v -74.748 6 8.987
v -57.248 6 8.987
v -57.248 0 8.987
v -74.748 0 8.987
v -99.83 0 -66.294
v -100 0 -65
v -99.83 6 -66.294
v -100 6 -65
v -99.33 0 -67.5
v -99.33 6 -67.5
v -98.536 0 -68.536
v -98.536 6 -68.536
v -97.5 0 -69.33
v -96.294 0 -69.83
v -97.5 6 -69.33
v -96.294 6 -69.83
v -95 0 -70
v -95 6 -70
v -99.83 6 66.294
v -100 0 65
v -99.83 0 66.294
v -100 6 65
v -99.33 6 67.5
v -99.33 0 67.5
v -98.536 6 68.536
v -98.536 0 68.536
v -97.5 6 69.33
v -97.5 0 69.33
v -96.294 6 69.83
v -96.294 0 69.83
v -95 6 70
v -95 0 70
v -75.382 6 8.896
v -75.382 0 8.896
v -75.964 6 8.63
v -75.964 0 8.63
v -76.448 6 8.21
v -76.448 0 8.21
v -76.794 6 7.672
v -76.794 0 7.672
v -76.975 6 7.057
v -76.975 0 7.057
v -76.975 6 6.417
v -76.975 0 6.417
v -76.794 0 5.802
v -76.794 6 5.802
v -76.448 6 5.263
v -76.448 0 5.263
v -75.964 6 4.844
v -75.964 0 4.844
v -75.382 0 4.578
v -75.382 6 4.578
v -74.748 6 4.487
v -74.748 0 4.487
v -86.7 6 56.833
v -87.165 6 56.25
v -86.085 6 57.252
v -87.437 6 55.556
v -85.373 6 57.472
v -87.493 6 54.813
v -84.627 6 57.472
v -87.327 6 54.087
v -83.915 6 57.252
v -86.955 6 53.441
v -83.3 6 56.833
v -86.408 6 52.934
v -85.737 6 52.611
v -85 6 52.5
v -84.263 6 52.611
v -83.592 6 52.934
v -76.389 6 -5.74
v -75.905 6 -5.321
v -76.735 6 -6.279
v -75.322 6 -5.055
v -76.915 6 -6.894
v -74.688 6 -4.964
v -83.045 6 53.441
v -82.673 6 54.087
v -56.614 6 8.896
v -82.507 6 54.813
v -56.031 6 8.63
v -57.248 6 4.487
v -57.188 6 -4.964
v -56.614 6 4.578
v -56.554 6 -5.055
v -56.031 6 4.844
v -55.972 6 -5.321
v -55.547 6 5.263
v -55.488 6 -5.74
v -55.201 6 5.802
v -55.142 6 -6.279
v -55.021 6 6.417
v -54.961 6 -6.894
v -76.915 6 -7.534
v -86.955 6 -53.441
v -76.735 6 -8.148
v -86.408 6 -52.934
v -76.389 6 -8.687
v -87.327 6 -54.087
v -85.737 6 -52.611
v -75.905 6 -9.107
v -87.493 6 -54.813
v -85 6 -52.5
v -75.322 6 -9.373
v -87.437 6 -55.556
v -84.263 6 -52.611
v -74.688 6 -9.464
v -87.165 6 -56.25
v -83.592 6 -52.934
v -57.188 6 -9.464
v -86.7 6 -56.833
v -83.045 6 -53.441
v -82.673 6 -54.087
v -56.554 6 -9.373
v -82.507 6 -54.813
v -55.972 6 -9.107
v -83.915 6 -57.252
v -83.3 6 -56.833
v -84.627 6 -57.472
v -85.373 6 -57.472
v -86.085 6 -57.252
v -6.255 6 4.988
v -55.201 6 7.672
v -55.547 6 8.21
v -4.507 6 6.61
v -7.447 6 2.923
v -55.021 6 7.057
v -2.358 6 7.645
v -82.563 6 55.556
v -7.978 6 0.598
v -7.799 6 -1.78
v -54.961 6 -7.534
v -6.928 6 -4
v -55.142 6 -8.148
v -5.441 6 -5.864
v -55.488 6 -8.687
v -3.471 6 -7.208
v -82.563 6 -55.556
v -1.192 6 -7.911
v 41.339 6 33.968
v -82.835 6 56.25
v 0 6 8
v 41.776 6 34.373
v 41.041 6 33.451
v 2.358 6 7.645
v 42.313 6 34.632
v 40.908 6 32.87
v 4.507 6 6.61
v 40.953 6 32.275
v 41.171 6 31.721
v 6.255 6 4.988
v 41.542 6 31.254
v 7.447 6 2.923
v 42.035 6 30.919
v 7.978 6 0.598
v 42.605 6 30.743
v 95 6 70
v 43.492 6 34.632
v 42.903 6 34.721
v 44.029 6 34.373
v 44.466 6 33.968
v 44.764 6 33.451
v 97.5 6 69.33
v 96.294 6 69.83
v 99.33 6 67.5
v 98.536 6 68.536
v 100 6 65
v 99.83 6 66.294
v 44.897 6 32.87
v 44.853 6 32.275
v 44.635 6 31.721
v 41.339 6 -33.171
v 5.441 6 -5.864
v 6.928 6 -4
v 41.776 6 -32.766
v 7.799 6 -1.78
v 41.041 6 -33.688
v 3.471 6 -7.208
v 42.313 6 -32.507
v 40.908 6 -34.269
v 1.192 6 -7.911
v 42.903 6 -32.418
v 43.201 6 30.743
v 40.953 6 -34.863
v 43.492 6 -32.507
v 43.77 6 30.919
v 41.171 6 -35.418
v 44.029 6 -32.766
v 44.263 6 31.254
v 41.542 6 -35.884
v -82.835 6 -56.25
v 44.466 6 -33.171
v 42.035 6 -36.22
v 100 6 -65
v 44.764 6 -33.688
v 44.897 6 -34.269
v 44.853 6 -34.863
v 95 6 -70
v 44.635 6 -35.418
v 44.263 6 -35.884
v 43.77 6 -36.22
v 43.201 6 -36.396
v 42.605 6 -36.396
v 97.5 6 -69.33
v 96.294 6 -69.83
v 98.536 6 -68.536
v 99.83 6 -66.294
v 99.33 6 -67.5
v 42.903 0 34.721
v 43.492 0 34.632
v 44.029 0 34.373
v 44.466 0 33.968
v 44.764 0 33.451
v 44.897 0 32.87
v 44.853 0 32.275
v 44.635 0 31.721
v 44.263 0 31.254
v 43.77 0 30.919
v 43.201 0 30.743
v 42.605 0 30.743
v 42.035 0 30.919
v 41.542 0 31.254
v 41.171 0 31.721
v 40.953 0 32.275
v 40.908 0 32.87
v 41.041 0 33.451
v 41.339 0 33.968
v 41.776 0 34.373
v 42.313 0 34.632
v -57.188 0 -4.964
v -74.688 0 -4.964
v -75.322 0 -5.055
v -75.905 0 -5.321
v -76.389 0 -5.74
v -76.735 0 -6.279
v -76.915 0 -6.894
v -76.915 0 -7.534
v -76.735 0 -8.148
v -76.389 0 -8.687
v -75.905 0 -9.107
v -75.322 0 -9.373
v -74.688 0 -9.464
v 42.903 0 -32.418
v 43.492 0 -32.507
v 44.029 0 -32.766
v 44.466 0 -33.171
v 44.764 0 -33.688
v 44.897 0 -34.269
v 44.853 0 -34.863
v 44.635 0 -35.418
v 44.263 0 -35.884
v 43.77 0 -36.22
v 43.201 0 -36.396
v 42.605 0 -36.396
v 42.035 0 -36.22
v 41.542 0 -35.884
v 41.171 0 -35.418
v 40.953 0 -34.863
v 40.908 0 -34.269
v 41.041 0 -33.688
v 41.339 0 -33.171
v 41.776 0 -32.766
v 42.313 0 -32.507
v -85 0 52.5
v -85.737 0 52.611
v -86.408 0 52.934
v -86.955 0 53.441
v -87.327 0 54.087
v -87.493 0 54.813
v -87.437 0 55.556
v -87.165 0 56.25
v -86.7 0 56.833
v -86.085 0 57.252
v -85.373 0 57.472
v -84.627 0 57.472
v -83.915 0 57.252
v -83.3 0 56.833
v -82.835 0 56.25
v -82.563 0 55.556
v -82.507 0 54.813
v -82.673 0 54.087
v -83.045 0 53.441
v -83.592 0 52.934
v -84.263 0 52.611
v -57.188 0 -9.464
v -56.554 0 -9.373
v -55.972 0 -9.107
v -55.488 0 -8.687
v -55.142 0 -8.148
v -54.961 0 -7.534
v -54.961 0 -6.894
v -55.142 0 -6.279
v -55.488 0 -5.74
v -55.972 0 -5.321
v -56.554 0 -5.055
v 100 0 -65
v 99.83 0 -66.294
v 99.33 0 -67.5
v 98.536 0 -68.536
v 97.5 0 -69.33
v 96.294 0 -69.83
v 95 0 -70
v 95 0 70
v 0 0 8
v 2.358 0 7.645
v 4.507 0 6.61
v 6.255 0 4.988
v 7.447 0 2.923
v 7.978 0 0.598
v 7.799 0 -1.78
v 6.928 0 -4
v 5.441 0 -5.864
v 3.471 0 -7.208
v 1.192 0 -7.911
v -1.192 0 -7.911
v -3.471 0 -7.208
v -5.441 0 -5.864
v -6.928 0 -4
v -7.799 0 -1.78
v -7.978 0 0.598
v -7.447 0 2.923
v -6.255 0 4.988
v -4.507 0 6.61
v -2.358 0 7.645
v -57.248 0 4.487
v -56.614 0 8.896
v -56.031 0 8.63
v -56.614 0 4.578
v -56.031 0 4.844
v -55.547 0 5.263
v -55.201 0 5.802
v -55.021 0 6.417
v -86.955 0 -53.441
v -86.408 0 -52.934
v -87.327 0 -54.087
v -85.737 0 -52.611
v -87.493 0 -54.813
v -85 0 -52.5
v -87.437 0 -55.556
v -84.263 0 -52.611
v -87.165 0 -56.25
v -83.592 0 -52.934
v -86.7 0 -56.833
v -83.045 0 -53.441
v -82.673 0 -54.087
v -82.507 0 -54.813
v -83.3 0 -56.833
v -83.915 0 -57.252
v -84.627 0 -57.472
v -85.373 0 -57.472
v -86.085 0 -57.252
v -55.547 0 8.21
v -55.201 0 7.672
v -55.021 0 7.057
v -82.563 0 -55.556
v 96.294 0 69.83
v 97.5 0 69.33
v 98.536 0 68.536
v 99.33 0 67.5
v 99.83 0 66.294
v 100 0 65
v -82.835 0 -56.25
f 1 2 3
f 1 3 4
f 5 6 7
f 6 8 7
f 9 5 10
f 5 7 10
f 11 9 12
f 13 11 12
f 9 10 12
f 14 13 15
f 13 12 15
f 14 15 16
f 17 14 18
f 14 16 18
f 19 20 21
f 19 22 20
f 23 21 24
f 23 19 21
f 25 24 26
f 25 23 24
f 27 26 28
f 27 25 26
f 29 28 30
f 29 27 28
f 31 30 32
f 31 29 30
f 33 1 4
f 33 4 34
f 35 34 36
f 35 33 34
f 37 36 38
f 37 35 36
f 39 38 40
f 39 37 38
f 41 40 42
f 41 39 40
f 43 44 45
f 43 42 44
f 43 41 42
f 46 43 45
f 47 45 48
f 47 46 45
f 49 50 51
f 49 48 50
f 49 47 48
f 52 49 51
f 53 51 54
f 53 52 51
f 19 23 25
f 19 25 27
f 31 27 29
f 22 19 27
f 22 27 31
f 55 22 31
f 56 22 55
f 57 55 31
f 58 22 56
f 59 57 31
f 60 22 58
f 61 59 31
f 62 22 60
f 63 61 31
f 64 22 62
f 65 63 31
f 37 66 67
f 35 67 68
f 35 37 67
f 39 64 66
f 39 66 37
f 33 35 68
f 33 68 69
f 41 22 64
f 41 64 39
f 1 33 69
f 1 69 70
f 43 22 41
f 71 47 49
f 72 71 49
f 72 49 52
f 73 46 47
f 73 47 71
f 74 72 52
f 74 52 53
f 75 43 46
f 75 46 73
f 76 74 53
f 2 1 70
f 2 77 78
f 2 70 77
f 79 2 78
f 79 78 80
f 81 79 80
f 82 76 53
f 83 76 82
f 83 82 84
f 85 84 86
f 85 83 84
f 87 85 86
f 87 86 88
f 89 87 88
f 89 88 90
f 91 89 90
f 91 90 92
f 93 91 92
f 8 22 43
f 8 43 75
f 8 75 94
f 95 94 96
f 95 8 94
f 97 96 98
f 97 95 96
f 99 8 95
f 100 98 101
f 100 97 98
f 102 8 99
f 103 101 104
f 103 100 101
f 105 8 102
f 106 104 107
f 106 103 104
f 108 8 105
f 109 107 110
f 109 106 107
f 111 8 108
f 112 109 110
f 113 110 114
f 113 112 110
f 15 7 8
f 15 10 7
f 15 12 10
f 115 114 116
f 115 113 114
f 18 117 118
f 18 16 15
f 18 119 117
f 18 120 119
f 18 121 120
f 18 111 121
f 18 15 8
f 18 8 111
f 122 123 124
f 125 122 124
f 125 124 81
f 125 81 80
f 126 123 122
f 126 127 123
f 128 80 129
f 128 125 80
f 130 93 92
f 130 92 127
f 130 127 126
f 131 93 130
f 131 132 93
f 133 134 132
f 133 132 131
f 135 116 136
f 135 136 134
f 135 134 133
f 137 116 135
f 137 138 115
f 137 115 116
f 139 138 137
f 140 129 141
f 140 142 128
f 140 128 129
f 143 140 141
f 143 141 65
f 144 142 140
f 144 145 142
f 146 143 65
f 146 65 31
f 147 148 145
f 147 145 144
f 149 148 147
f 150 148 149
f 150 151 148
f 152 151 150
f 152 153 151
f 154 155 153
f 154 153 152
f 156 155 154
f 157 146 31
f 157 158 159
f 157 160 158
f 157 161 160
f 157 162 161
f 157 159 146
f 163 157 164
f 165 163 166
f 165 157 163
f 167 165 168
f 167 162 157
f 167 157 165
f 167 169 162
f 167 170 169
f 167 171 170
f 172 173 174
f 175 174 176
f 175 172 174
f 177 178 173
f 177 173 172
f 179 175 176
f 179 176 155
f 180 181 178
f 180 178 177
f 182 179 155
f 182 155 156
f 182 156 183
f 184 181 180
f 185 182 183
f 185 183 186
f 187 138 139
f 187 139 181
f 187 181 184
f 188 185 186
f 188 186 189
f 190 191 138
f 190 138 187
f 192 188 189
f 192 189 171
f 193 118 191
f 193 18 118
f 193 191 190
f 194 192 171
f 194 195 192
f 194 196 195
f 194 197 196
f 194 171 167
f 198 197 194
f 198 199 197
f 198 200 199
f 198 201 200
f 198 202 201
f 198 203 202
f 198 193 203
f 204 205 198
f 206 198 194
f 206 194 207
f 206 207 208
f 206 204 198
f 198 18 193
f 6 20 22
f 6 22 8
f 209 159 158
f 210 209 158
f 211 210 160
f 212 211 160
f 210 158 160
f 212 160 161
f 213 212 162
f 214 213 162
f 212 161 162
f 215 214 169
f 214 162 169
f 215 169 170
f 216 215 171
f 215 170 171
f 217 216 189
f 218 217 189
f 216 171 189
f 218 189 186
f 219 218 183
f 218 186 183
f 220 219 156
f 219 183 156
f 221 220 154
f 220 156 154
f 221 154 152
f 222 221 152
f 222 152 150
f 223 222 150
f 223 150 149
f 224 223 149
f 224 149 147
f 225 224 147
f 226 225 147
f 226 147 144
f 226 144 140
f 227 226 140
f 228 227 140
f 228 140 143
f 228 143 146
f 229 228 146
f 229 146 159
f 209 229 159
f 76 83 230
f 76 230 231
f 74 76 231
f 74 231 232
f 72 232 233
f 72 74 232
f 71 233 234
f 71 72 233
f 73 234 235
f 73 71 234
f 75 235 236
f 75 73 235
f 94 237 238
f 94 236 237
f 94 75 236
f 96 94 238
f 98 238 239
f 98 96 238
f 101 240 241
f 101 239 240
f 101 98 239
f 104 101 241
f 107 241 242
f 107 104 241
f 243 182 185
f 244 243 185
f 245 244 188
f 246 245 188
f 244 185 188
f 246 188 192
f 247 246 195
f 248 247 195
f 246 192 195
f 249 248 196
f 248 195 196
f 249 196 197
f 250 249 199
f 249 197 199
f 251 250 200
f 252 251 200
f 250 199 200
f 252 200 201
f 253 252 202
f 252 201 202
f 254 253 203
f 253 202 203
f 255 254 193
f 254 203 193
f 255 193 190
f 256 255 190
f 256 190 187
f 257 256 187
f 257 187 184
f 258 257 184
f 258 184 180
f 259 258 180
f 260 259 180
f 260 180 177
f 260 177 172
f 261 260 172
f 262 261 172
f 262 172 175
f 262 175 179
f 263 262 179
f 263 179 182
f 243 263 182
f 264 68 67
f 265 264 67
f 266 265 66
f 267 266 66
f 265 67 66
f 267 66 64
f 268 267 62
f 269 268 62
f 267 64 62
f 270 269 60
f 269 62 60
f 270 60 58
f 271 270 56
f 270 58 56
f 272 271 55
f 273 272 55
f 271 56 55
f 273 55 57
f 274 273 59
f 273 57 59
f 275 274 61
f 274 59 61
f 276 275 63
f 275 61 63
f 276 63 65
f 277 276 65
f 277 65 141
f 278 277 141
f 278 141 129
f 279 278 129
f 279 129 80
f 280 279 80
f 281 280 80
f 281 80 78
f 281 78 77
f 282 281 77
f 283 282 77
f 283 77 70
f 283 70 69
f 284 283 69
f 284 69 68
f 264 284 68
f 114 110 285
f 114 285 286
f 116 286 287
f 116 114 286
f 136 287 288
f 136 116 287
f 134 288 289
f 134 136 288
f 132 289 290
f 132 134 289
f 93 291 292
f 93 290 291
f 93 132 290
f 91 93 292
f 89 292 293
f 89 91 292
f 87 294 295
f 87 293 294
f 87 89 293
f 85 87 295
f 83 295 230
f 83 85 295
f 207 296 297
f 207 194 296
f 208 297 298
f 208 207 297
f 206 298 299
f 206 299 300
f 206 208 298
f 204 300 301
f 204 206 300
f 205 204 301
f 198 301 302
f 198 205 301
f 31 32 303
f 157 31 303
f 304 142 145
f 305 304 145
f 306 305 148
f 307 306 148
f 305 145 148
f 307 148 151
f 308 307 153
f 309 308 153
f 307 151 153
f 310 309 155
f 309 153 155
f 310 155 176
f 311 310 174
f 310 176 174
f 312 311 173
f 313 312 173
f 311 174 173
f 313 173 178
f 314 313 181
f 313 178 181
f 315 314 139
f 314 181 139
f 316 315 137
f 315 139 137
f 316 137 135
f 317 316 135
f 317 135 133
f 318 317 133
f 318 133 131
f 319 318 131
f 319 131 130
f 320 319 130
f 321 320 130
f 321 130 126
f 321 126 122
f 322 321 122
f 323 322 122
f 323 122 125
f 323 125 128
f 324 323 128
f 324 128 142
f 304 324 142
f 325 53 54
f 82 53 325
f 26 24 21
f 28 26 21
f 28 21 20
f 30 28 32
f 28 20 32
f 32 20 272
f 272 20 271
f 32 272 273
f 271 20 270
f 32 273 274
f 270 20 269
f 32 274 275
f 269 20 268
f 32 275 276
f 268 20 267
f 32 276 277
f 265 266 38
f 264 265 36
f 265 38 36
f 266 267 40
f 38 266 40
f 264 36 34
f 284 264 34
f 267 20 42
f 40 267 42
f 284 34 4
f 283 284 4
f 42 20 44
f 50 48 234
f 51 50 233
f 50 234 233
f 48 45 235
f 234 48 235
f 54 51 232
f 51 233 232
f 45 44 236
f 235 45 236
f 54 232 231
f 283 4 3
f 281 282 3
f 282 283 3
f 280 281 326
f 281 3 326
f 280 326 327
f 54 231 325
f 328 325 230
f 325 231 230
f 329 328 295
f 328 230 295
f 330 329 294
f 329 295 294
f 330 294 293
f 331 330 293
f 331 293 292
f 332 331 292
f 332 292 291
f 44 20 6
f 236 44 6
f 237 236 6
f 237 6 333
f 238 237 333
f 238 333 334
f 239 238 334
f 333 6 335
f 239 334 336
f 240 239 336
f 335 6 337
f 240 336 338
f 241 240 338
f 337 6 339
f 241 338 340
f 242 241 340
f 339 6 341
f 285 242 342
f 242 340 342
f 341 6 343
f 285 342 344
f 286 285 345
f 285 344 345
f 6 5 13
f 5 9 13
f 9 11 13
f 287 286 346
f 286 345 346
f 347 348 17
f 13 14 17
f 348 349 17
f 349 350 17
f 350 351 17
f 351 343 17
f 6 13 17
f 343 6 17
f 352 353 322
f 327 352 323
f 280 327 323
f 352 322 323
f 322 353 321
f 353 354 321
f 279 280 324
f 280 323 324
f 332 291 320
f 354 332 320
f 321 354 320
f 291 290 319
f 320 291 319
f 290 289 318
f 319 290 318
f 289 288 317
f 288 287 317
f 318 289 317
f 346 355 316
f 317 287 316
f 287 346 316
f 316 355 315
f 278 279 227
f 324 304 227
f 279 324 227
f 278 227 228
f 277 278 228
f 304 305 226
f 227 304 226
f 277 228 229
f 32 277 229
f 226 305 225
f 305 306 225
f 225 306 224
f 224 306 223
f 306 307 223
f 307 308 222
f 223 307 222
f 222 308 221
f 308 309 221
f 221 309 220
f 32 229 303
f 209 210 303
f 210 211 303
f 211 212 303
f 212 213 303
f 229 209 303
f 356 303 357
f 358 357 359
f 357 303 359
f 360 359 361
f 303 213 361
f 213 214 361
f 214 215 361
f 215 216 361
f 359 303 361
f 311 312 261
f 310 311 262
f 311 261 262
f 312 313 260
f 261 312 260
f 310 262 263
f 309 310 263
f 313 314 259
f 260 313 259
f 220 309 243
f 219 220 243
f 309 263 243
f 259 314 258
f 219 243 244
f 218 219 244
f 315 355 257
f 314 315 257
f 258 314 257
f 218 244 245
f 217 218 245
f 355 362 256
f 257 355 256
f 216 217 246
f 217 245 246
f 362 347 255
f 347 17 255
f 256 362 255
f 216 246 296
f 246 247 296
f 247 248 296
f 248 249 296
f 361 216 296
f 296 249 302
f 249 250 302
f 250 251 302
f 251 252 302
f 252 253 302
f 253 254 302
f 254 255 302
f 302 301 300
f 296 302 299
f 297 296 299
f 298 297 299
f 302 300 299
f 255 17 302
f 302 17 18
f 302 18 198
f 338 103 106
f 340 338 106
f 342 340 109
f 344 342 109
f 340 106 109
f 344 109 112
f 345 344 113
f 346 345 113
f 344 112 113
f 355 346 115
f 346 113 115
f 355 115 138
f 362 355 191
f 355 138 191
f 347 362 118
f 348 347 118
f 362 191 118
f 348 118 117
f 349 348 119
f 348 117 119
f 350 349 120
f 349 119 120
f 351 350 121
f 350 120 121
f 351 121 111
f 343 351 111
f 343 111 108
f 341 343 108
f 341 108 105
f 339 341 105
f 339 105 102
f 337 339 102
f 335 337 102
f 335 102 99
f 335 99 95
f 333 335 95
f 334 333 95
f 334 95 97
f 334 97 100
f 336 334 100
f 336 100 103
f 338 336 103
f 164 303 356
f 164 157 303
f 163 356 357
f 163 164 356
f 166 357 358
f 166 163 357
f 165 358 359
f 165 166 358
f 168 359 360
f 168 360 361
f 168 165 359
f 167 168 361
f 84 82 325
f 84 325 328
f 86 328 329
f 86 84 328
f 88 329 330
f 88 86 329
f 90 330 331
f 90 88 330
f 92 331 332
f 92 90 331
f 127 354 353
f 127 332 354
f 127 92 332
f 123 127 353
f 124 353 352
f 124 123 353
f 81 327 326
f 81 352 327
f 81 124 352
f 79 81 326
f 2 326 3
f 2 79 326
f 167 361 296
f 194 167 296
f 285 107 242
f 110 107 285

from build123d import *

# Parameters (mm, degrees)
SKETCH2_W           = 200
SKETCH2_H           = 140
BOSS_EXTRUDE1_DEPTH = 6
FILLET1_R           = 5
SKETCH3_R           = 2.5
CUT_EXTRUDE1_DEPTH  = 123.21292894
SKETCH4_R           = 8
CUT_EXTRUDE2_DEPTH  = 123.21292894
CUT_EXTRUDE4_DEPTH  = 123.21292894
SKETCH7_R           = 2
CUT_EXTRUDE5_DEPTH  = 123.21292894


with BuildPart() as part:
    # Sketch2 → Boss-Extrude1 (new body)
    with BuildSketch(Plane(origin=(0, 0, 0), x_dir=(1, 0, 0), z_dir=(0, 1, 0))):
        Rectangle(SKETCH2_W, SKETCH2_H)
    extrude(amount=BOSS_EXTRUDE1_DEPTH)

    # Fillet1
    fillet1_edges = [part.edges().sort_by_distance(p)[0] for p in [
        (100, 3, 70),
        (-100, 3, 70),
        (-100, 3, -70),
        (100, 3, -70),
    ]]
    fillet(fillet1_edges, radius=FILLET1_R)

    # Sketch3 → Cut-Extrude1 (cut, through all)
    with BuildSketch(Plane(origin=(0, 6, 0), x_dir=(1, 0, 0), z_dir=(0, 1, 0))):
        with Locations(Location((-85, 55, 0), (0, 0, 270))):
            Circle(SKETCH3_R)
        with Locations(Location((-85, -55, 0), (0, 0, 90))):
            Circle(SKETCH3_R)
    extrude(amount=-CUT_EXTRUDE1_DEPTH, mode=Mode.SUBTRACT)

    # Sketch4 → Cut-Extrude2 (cut, through all)
    with BuildSketch(Plane(origin=(0, 6, 0), x_dir=(1, 0, 0), z_dir=(0, 1, 0))):
        with Locations(Location((0, 0, 0), (0, 0, 270))):
            Circle(SKETCH4_R)
    extrude(amount=-CUT_EXTRUDE2_DEPTH, mode=Mode.SUBTRACT)

    # Sketch6 → Cut-Extrude4 (cut, through all)
    with BuildSketch(Plane(origin=(0, 6, 0), x_dir=(1, 0, 0), z_dir=(0, 1, 0))):
        with BuildLine():
            Line((-74.688373307, 9.463724756), (-57.188373307, 9.463724756))
            ThreePointArc((-57.188373307, 9.463724756), (-54.938373307, 7.213724756), (-57.188373307, 4.963724756))
            Line((-57.188373307, 4.963724756), (-74.688373307, 4.963724756))
            ThreePointArc((-74.688373307, 4.963724756), (-76.938373307, 7.213724756), (-74.688373307, 9.463724756))
        make_face()
        with BuildLine():
            Line((-74.74772766, -4.486928349), (-57.24772766, -4.486928349))
            ThreePointArc((-57.24772766, -4.486928349), (-54.99772766, -6.736928349), (-57.24772766, -8.986928349))
            Line((-57.24772766, -8.986928349), (-74.74772766, -8.986928349))
            ThreePointArc((-74.74772766, -8.986928349), (-76.99772766, -6.736928349), (-74.74772766, -4.486928349))
        make_face()
    extrude(amount=-CUT_EXTRUDE4_DEPTH, mode=Mode.SUBTRACT)

    # Sketch7 → Cut-Extrude5 (cut, through all)
    with BuildSketch(Plane(origin=(0, 6, 0), x_dir=(1, 0, 0), z_dir=(0, 1, 0))):
        with Locations(Location((42.902668062, -32.720520695, 0), (0, 0, 270))):
            Circle(SKETCH7_R)
        with Locations(Location((42.902668062, 34.418343412, 0), (0, 0, 270))):
            Circle(SKETCH7_R)
    extrude(amount=-CUT_EXTRUDE5_DEPTH, mode=Mode.SUBTRACT)


solid = part.part
